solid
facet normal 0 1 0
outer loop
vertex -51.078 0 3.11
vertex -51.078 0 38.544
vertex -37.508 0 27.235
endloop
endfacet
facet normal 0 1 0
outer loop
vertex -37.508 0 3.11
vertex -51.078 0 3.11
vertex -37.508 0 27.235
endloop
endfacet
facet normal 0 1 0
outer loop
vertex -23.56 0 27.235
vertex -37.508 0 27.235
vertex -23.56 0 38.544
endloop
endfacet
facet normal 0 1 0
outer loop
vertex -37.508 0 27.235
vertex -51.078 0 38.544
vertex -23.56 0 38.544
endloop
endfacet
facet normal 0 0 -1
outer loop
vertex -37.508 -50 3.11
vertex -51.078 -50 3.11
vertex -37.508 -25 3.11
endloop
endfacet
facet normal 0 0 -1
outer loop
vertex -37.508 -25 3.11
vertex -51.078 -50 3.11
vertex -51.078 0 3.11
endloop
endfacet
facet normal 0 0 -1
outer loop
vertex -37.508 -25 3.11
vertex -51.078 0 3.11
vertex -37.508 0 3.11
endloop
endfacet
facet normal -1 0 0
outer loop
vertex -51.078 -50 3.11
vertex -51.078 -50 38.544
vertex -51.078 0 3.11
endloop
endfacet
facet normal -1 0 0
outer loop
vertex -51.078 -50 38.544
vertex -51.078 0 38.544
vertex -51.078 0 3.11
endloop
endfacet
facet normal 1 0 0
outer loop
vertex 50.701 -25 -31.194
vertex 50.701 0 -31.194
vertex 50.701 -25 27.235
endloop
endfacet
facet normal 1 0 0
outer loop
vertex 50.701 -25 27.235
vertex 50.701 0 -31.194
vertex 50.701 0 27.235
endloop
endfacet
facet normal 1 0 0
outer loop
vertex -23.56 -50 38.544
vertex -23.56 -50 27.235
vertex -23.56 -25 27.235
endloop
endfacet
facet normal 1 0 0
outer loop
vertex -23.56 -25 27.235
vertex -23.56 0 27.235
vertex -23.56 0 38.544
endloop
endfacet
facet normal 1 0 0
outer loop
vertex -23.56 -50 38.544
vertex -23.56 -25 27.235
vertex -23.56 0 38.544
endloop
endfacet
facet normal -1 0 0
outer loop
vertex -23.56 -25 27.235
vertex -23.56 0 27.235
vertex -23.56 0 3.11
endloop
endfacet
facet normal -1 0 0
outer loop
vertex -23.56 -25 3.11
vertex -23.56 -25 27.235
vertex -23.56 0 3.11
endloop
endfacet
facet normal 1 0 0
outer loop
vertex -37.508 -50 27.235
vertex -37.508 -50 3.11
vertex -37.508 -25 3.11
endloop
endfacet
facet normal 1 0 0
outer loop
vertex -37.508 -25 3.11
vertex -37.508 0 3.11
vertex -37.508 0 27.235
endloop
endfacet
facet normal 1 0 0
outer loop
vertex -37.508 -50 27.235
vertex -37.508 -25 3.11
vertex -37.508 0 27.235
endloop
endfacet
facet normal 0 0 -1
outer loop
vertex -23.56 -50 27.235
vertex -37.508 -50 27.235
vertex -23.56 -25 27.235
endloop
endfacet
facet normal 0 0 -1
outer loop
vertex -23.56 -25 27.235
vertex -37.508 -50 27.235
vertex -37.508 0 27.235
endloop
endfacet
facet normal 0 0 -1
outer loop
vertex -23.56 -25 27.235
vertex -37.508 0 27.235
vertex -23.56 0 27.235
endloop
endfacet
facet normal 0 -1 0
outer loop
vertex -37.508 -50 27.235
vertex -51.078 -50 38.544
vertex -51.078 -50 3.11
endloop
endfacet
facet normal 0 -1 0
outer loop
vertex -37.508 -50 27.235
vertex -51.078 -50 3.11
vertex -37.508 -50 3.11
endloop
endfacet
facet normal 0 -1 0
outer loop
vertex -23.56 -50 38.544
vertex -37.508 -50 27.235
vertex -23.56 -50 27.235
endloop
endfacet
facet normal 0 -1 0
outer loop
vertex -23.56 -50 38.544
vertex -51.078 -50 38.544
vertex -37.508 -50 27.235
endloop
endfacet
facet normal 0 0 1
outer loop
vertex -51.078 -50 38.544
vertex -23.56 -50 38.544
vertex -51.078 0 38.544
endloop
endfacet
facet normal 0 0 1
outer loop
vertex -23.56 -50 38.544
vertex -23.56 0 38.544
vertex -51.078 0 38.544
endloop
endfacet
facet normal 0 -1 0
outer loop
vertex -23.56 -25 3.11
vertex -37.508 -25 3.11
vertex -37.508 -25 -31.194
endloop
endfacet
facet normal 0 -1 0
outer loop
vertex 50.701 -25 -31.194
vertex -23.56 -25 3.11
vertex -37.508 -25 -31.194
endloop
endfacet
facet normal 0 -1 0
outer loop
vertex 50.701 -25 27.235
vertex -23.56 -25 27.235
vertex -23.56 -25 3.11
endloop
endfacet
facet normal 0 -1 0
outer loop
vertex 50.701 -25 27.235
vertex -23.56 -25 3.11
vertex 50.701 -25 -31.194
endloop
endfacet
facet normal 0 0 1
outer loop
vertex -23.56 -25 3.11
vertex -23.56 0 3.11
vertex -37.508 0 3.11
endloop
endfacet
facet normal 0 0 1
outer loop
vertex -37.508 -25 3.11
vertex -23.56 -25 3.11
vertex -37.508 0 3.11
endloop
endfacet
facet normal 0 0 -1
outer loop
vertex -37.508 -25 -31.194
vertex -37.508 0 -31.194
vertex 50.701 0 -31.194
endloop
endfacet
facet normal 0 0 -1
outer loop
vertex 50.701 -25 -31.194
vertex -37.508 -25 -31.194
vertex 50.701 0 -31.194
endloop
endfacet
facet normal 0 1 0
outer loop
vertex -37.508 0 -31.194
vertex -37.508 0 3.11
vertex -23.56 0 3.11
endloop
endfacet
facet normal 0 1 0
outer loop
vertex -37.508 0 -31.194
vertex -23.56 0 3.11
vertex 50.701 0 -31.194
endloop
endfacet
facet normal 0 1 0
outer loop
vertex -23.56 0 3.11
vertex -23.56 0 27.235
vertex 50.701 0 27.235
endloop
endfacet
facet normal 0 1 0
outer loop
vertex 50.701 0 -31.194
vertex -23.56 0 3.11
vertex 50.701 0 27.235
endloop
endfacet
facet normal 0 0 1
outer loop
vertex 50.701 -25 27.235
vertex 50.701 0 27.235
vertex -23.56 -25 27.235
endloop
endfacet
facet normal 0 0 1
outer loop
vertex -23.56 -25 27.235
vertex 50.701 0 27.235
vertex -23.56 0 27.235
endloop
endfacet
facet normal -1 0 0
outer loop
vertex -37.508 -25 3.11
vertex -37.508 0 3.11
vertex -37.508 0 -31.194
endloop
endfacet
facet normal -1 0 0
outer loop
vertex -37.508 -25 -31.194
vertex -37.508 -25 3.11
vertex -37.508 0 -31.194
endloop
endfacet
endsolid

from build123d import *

# Parameters (mm, degrees)
F1_DEPTH = 25
F2_DEPTH = 25


with BuildPart() as f1:
    # F0 (on Front) → F1 (new body)
    with BuildSketch(Plane.XZ):
        Polygon((-37.5076346099, 27.2354409099), (-23.560071364, 27.2354409099), (-23.560071364, 38.5442748666), (-51.0782338679, 38.5442748666), (-51.0782338679, 3.1099293847), (-37.5076346099, 3.1099293847), align=None)
    extrude(amount=F1_DEPTH)

    # F2 (add): a face of the model
    f2_faces = [f1.faces().sort_by_distance(p)[0] for p in [
        (-40.8944956817, -25, 23.8065550076),
    ]]


with BuildPart() as f1b:
    # F0 (on Front) → F1, piece 2 (new body)
    with BuildSketch(Plane.XZ):
        Polygon((-12.6281967387, 27.2354409099), (-12.816679664, 27.2354409099), (-23.560071364, 27.2354409099), (-23.560071364, 3.1099293847), (-37.5076346099, 3.1099293847), (-37.5076346099, -31.1935339123), (50.7012717426, -31.1935339123), (50.7012717426, 27.2354409099), align=None)
    extrude(amount=F1_DEPTH)


with BuildPart() as f1_1:
    add(f1.part)

    add(f1b.part)  # F2 merges F1b
    extrude(f2_faces, amount=F2_DEPTH)


solid = f1_1.part
